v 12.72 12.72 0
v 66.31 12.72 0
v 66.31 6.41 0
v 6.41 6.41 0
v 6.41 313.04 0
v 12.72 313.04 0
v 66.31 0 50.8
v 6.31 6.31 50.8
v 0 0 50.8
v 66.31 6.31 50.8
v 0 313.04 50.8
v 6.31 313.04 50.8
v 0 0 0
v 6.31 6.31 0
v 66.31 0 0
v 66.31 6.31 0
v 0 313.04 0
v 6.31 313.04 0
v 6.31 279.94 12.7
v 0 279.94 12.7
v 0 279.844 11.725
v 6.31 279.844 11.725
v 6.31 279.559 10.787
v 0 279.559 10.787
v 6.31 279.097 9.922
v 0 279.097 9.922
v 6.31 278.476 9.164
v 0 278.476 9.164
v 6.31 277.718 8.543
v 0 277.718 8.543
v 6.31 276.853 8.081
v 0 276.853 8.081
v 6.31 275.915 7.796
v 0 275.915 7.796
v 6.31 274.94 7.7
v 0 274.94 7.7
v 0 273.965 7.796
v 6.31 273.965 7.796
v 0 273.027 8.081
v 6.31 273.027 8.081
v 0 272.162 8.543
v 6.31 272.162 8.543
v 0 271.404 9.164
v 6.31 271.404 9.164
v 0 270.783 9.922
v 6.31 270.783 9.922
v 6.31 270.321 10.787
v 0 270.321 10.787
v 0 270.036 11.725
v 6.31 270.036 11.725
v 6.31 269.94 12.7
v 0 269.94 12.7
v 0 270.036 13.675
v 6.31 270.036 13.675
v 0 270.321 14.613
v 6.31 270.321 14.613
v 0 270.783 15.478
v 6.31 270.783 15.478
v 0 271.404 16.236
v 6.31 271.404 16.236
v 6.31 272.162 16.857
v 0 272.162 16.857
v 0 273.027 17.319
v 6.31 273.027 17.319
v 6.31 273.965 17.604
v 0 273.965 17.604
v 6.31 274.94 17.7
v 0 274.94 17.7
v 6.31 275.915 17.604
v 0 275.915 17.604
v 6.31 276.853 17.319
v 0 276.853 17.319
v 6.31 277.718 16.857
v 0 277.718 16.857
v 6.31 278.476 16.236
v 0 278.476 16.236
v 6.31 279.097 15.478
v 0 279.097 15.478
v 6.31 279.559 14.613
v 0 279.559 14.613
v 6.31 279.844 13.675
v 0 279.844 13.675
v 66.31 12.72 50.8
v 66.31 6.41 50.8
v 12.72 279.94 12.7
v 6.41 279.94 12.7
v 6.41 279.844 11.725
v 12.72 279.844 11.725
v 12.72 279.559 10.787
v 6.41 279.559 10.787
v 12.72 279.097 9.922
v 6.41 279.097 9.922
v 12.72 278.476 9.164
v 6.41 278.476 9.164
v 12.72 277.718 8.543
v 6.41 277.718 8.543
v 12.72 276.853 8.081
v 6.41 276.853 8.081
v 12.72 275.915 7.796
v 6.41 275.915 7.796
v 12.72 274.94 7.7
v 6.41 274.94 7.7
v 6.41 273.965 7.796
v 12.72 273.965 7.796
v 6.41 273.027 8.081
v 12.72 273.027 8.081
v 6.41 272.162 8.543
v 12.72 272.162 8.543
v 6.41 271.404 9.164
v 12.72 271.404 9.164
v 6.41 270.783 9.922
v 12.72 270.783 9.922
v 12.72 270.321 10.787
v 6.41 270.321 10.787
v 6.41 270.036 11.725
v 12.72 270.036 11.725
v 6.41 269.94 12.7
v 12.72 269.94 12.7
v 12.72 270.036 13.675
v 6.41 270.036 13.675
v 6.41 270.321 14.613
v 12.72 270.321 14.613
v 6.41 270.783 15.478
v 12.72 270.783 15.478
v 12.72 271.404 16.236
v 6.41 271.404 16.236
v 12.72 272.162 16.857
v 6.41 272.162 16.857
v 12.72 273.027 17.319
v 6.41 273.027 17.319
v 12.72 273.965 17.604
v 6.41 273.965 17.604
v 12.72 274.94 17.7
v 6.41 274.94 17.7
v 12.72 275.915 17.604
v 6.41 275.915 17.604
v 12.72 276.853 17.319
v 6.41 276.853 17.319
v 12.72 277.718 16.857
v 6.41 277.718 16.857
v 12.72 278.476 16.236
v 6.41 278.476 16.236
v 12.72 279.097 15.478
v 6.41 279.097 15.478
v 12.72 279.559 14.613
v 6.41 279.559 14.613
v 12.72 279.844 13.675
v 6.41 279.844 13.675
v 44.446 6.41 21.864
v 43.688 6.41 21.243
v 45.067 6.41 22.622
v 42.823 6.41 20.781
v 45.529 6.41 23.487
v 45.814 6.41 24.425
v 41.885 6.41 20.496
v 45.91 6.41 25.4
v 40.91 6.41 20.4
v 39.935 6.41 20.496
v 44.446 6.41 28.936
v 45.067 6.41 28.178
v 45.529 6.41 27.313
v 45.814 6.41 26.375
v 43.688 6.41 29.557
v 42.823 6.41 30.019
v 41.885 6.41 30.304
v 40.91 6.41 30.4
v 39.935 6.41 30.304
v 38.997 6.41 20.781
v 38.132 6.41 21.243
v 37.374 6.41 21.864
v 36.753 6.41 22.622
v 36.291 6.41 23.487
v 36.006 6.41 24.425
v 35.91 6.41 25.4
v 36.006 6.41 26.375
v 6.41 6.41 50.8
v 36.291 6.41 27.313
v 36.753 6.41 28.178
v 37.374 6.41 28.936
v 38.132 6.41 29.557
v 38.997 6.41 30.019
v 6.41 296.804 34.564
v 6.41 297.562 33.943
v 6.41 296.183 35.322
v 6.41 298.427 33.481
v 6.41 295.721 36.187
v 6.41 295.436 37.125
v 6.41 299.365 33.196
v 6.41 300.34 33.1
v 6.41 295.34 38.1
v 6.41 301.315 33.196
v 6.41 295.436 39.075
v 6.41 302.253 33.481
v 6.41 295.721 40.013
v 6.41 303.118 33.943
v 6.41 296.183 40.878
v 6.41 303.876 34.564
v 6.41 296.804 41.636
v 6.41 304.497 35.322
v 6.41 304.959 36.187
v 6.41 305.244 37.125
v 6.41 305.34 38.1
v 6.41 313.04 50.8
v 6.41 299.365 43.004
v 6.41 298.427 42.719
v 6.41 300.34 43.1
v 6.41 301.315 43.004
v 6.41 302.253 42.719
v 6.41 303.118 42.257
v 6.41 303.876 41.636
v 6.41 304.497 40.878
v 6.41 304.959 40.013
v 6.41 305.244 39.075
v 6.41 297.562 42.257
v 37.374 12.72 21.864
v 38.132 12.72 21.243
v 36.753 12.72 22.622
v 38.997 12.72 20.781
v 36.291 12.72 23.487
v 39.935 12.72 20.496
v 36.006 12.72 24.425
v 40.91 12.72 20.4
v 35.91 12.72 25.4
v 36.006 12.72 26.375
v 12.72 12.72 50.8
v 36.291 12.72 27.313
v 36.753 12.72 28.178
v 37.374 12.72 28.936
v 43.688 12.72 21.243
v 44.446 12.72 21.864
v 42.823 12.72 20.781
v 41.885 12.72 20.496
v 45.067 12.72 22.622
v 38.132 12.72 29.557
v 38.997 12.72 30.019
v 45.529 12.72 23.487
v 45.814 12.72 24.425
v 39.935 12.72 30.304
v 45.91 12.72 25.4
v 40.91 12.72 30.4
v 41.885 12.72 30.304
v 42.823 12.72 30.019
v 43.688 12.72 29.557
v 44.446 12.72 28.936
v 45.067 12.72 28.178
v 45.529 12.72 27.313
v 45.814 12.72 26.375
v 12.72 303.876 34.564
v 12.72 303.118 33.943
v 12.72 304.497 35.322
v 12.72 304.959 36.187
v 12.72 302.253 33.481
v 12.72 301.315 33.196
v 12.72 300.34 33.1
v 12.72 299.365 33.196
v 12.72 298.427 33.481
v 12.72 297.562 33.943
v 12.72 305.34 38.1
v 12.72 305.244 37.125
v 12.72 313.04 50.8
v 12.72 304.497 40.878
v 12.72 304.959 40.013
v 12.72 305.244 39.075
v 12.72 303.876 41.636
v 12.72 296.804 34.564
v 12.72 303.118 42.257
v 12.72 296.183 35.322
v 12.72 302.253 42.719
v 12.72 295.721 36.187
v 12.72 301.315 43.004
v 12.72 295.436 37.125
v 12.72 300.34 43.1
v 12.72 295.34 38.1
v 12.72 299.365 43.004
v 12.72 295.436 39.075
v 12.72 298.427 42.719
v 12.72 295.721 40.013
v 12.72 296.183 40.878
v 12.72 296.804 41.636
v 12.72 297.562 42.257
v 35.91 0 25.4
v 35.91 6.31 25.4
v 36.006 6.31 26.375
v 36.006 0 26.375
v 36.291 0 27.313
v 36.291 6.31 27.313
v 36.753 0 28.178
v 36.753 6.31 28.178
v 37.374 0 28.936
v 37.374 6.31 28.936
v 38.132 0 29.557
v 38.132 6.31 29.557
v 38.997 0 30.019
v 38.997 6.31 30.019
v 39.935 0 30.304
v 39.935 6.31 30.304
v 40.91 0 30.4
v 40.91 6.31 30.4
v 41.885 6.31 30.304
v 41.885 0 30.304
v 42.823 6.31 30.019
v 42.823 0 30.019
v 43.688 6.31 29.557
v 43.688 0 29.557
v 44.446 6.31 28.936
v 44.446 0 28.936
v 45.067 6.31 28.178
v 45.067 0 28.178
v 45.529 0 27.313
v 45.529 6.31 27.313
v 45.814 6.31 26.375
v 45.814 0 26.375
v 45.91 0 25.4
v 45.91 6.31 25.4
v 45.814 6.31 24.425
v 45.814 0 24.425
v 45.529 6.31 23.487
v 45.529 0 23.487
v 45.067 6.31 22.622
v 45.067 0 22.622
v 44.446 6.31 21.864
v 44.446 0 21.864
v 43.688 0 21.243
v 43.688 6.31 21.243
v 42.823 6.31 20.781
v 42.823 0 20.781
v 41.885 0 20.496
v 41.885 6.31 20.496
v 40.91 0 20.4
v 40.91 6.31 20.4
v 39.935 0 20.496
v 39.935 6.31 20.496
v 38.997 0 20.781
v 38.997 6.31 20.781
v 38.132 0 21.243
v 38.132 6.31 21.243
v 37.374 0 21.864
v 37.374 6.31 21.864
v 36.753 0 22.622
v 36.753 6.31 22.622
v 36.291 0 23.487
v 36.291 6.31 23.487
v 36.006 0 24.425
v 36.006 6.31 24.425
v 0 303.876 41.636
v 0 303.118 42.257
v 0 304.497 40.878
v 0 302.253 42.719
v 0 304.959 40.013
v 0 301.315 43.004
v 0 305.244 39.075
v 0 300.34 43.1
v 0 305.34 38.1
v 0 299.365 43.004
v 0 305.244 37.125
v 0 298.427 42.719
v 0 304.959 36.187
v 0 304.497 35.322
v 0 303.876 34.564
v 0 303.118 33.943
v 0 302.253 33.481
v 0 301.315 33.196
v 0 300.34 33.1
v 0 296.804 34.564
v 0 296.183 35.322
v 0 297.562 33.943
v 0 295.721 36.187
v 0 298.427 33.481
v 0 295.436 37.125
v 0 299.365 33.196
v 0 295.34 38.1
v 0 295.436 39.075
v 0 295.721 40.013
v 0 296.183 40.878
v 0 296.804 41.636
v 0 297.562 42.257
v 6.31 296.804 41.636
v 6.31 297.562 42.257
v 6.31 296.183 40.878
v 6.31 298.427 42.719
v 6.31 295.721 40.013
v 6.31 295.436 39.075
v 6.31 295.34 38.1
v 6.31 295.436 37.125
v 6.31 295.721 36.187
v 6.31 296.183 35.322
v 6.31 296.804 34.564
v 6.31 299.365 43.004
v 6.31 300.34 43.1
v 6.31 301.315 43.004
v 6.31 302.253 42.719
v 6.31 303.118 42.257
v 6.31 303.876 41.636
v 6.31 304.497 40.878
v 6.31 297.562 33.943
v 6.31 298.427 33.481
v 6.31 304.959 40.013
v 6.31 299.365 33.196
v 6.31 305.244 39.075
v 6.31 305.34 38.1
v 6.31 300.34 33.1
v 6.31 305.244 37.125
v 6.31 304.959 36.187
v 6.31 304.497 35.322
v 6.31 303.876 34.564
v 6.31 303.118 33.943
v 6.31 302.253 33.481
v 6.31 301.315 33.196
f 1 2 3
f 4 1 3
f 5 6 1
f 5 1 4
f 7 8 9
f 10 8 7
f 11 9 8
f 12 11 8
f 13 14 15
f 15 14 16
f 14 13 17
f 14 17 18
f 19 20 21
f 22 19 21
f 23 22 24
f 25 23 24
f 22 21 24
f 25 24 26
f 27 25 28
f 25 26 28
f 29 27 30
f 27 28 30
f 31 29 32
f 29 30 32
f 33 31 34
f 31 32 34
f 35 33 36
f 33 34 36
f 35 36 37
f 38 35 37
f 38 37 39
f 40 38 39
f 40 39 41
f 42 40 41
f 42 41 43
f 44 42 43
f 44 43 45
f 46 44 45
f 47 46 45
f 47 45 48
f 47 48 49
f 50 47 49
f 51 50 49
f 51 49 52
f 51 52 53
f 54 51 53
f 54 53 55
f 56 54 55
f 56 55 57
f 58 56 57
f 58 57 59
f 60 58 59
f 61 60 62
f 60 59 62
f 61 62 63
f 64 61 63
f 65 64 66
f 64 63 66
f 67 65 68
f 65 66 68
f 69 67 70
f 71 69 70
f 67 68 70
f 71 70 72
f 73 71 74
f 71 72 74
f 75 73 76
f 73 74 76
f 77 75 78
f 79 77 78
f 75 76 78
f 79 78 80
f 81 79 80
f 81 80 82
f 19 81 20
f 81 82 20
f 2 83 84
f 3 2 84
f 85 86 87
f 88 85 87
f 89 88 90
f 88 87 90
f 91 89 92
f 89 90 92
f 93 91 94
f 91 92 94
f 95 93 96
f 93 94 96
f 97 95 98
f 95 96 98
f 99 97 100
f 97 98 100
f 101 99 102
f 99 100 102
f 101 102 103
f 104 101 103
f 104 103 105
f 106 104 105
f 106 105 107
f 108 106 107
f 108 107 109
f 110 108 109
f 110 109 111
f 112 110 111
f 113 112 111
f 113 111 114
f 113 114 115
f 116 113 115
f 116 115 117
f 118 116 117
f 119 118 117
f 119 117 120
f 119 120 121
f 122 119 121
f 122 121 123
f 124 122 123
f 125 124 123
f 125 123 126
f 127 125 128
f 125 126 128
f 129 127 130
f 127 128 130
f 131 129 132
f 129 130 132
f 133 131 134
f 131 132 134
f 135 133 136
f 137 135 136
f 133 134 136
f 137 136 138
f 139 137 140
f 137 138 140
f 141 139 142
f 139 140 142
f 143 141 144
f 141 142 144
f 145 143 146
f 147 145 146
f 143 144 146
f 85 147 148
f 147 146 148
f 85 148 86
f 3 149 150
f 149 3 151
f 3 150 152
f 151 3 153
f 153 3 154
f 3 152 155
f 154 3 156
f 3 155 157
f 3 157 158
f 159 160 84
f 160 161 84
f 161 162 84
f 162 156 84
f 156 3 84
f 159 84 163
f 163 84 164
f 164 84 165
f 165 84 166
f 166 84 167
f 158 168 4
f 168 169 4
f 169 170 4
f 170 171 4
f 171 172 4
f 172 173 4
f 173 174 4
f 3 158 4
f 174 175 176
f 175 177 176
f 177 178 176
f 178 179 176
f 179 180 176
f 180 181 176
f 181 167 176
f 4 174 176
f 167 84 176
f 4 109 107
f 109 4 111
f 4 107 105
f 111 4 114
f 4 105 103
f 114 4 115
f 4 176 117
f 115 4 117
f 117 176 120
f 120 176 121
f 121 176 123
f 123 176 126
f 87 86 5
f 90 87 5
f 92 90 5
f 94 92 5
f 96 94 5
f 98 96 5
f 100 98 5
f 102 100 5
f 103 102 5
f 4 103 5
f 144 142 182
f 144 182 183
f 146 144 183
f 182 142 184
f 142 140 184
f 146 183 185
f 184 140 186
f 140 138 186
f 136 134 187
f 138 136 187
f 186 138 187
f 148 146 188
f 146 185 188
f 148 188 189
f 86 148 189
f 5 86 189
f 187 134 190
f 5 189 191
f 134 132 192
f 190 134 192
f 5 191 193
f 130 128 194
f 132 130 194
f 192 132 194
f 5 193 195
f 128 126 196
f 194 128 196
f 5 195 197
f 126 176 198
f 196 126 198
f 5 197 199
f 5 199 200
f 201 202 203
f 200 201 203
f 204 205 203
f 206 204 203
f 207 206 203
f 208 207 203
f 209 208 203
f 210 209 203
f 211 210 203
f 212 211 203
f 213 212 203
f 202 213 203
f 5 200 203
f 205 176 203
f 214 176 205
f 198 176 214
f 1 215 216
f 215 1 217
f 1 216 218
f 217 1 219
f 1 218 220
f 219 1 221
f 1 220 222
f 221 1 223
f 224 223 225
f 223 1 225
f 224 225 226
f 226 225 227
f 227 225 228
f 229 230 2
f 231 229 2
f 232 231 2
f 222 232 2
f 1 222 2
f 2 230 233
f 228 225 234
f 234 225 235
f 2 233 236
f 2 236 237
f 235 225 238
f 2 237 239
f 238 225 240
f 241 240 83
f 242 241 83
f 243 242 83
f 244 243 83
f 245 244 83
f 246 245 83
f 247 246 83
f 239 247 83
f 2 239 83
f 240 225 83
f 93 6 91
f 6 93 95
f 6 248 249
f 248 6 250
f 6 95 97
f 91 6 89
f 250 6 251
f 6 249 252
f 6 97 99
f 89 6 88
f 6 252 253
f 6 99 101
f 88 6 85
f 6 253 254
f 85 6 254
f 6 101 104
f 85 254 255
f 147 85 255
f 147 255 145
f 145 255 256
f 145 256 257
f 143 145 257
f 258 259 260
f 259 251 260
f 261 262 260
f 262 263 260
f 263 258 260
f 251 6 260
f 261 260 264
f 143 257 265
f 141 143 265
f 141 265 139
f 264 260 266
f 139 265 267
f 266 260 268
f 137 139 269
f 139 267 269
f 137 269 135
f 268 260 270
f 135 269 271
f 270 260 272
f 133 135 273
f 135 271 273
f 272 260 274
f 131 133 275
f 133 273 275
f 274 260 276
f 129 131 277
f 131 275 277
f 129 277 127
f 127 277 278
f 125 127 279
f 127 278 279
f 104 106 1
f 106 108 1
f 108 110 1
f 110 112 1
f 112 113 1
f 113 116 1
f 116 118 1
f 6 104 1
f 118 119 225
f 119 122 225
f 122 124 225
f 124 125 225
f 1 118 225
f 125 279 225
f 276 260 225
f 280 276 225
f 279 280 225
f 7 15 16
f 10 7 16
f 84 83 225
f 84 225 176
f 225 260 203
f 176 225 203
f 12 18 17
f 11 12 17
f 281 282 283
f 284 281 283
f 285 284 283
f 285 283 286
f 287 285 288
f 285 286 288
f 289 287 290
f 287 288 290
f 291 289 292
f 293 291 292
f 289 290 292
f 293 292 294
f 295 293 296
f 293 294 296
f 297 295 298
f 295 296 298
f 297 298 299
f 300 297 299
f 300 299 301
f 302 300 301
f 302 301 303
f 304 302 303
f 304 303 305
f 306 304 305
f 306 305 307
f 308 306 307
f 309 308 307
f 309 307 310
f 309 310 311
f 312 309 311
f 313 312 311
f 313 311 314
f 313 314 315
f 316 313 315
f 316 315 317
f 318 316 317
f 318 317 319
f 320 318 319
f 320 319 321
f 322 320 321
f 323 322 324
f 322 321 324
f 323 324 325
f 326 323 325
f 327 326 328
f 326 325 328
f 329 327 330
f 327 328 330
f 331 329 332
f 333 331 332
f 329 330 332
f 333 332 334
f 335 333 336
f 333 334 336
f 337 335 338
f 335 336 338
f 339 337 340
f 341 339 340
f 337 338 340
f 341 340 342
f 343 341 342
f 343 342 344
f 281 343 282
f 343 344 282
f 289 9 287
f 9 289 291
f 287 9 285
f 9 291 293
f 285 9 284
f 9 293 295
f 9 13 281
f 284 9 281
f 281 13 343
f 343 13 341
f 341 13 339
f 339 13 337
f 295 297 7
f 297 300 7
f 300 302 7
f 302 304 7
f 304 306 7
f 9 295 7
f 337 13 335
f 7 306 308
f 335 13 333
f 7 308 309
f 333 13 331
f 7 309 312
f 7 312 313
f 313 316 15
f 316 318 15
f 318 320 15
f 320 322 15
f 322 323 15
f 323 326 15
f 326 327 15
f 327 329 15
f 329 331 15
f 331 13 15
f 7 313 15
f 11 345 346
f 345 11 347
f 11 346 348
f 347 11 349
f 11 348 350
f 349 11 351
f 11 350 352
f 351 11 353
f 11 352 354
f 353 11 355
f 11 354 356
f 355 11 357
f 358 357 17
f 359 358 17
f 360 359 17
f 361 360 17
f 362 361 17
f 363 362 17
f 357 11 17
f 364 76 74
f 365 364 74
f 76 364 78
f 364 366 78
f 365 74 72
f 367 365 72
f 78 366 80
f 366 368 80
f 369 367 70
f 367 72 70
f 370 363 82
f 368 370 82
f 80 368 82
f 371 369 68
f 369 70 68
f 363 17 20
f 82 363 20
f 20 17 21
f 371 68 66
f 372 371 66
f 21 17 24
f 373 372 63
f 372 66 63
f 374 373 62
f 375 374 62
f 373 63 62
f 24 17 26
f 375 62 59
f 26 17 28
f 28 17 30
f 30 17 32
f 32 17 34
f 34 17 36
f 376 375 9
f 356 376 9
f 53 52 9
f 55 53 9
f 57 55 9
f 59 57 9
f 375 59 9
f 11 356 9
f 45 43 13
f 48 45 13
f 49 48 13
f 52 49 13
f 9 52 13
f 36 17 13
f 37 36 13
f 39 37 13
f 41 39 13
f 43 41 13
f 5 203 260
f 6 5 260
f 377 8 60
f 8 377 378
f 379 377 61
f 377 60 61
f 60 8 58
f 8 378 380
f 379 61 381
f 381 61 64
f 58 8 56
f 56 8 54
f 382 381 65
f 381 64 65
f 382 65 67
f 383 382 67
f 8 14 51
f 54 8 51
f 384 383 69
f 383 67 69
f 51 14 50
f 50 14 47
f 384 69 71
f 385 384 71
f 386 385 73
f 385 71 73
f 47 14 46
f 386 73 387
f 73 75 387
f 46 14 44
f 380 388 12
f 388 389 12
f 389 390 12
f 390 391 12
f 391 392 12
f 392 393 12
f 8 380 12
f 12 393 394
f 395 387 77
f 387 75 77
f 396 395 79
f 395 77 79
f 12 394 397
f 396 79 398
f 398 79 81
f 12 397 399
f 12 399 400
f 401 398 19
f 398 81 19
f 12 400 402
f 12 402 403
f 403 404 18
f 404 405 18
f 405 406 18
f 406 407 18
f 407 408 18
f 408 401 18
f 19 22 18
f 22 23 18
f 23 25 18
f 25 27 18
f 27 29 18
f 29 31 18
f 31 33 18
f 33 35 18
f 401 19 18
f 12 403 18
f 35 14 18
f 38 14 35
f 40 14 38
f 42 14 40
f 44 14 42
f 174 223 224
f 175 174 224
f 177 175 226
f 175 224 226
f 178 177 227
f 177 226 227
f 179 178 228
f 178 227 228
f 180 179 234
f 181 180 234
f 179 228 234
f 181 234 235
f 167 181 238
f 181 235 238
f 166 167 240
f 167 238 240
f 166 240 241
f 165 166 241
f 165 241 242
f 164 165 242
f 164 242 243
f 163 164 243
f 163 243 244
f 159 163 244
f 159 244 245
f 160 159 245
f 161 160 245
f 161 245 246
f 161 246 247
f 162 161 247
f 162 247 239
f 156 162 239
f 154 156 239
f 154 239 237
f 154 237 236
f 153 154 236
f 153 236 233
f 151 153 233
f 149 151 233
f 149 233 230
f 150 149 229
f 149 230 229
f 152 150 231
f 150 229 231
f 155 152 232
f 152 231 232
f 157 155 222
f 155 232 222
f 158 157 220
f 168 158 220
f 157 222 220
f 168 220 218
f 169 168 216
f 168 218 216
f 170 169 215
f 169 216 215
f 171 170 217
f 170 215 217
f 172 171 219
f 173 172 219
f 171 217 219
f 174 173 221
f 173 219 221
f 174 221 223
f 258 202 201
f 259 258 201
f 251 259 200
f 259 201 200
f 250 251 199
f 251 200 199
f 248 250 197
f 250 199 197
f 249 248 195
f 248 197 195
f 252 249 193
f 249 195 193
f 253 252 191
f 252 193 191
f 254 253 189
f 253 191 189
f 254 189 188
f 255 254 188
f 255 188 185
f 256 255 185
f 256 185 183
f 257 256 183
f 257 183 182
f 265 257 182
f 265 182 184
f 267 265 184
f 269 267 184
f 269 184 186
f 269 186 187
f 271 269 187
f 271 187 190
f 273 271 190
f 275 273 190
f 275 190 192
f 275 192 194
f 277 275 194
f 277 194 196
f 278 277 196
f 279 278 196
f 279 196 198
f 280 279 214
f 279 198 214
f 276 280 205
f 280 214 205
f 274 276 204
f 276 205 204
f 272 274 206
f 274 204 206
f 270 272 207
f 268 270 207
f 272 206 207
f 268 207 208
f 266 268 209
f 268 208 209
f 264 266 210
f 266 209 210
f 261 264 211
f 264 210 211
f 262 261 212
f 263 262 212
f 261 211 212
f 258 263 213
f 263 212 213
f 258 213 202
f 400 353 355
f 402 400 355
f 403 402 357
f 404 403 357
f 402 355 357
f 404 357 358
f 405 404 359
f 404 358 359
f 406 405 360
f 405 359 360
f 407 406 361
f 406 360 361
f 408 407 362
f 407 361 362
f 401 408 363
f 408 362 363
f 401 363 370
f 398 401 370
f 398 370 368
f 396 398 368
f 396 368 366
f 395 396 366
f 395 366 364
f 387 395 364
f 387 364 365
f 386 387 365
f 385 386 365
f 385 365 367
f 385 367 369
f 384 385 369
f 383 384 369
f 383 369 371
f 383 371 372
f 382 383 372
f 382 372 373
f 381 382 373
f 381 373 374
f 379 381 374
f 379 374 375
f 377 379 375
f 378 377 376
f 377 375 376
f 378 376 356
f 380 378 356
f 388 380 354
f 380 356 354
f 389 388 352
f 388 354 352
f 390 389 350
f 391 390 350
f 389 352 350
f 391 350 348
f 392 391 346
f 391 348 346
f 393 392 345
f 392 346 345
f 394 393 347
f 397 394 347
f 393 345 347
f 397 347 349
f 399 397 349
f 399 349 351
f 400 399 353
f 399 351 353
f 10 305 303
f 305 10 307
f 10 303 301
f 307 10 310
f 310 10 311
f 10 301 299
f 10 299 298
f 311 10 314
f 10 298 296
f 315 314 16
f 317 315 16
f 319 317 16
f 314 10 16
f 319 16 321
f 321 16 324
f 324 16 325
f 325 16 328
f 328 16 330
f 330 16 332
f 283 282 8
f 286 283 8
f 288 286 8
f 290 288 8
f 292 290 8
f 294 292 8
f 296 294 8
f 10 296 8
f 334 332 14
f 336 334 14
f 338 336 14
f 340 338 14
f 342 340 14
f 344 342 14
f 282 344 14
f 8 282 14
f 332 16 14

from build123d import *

# Parameters (mm, degrees)
SALIENTE_EXTRUIR1_DEPTH = 50.8
SALIENTE_EXTRUIR2_DEPTH = 50.8
CROQUIS3_R              = 5
CORTAR_EXTRUIR1_DEPTH   = 102.525
CROQUIS5_R              = 5
CORTAR_EXTRUIR2_DEPTH   = 24.525


with BuildPart() as part:
    # Croquis1 → Saliente-Extruir1 (new body)
    with BuildSketch(Plane.XY):
        Polygon((0, 0), (66.31, 0), (66.31, 6.31), (6.31, 6.31), (6.31, 313.04), (0, 313.04), align=None)
    extrude(amount=SALIENTE_EXTRUIR1_DEPTH)


with BuildPart() as body_2:
    # Croquis2 → Saliente-Extruir2 (new body)
    with BuildSketch(Plane.XY.offset(50.8)):
        Polygon((6.41, 313.04), (12.72, 313.04), (12.72, 12.72), (66.31, 12.72), (66.31, 6.41), (6.41, 6.41), align=None)
    extrude(amount=-SALIENTE_EXTRUIR2_DEPTH)


with BuildPart() as cortar_extruir1_tool:
    # Croquis3 → Cortar-Extruir1 (new body)
    with BuildSketch(Plane.ZY):
        with Locations(Location((12.7, 274.94, 0), (0, 0, 90))):
            Circle(CROQUIS3_R)
        with Locations(Location((38.1, 300.34, 0), (0, 0, 90))):
            Circle(CROQUIS3_R)
    extrude(amount=-CORTAR_EXTRUIR1_DEPTH)


with BuildPart() as part_1:
    add(part.part)

    # Cortar-Extruir1: cut by cortar_extruir1_tool
    add(cortar_extruir1_tool.part, mode=Mode.SUBTRACT)


with BuildPart() as body_2_1:
    add(body_2.part)

    # Cortar-Extruir1: cut by cortar_extruir1_tool
    add(cortar_extruir1_tool.part, mode=Mode.SUBTRACT)


with BuildPart() as cortar_extruir2_tool:
    # Croquis5 → Cortar-Extruir2 (new body)
    with BuildSketch(Plane(origin=(0, 12.72, 0), x_dir=(1, 0, 0), z_dir=(0, 1, 0))):
        with Locations(Location((40.91, -25.4, 0), (0, 0, 180))):
            Circle(CROQUIS5_R)
    extrude(amount=-CORTAR_EXTRUIR2_DEPTH)


with BuildPart() as part_2:
    add(part_1.part)

    # Cortar-Extruir2: cut by cortar_extruir2_tool
    add(cortar_extruir2_tool.part, mode=Mode.SUBTRACT)


with BuildPart() as body_2_2:
    add(body_2_1.part)

    # Cortar-Extruir2: cut by cortar_extruir2_tool
    add(cortar_extruir2_tool.part, mode=Mode.SUBTRACT)


solid = Compound([part_2.part, body_2_2.part])
